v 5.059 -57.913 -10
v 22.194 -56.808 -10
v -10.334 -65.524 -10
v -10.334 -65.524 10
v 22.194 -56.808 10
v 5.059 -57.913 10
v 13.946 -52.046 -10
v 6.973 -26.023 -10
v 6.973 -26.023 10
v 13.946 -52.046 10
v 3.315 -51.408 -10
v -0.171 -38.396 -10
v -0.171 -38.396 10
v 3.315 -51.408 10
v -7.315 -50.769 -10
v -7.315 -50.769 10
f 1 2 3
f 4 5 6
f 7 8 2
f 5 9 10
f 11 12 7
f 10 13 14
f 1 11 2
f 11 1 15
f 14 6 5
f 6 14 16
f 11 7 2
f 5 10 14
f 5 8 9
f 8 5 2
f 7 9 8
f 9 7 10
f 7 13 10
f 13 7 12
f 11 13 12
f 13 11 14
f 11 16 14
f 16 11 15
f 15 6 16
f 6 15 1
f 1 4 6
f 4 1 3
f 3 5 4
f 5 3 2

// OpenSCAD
polyhedron(
    points=[
    [22.1944598552339, -56.8080678841871, -10],
    [6.97278394209356, -26.0227839420936, -10],
    [13.9455678841871, -52.0455678841871, -10],
    [-0.17096605790644, -38.3961218986637, -10],
    [3.31542591314034, -51.4075138697105, -10],
    [-7.31471605790644, -50.7694598552339, -10],
    [5.05862189866373, -57.9132098552339, -10],
    [-10.334020072383, -65.5240478118041, -10],
    [22.1944598552339, -56.8080678841871, 10],
    [6.97278394209356, -26.0227839420936, 10],
    [13.9455678841871, -52.0455678841871, 10],
    [-0.17096605790644, -38.3961218986637, 10],
    [3.31542591314034, -51.4075138697105, 10],
    [-7.31471605790644, -50.7694598552339, 10],
    [5.05862189866373, -57.9132098552339, 10],
    [-10.334020072383, -65.5240478118041, 10],
    ],
    faces=[
        [7,0,6],
        [14,8,15],
        [0,1,2],
        [10,9,8],
        [2,3,4],
        [12,11,10],
        [6,0,4,5],
        [13,12,8,14],
        [0,2,4],
        [12,10,8],
        [0,8,9,1],
        [1,9,10,2],
        [2,10,11,3],
        [3,11,12,4],
        [4,12,13,5],
        [5,13,14,6],
        [6,14,15,7],
        [7,15,8,0],
    ]
);
